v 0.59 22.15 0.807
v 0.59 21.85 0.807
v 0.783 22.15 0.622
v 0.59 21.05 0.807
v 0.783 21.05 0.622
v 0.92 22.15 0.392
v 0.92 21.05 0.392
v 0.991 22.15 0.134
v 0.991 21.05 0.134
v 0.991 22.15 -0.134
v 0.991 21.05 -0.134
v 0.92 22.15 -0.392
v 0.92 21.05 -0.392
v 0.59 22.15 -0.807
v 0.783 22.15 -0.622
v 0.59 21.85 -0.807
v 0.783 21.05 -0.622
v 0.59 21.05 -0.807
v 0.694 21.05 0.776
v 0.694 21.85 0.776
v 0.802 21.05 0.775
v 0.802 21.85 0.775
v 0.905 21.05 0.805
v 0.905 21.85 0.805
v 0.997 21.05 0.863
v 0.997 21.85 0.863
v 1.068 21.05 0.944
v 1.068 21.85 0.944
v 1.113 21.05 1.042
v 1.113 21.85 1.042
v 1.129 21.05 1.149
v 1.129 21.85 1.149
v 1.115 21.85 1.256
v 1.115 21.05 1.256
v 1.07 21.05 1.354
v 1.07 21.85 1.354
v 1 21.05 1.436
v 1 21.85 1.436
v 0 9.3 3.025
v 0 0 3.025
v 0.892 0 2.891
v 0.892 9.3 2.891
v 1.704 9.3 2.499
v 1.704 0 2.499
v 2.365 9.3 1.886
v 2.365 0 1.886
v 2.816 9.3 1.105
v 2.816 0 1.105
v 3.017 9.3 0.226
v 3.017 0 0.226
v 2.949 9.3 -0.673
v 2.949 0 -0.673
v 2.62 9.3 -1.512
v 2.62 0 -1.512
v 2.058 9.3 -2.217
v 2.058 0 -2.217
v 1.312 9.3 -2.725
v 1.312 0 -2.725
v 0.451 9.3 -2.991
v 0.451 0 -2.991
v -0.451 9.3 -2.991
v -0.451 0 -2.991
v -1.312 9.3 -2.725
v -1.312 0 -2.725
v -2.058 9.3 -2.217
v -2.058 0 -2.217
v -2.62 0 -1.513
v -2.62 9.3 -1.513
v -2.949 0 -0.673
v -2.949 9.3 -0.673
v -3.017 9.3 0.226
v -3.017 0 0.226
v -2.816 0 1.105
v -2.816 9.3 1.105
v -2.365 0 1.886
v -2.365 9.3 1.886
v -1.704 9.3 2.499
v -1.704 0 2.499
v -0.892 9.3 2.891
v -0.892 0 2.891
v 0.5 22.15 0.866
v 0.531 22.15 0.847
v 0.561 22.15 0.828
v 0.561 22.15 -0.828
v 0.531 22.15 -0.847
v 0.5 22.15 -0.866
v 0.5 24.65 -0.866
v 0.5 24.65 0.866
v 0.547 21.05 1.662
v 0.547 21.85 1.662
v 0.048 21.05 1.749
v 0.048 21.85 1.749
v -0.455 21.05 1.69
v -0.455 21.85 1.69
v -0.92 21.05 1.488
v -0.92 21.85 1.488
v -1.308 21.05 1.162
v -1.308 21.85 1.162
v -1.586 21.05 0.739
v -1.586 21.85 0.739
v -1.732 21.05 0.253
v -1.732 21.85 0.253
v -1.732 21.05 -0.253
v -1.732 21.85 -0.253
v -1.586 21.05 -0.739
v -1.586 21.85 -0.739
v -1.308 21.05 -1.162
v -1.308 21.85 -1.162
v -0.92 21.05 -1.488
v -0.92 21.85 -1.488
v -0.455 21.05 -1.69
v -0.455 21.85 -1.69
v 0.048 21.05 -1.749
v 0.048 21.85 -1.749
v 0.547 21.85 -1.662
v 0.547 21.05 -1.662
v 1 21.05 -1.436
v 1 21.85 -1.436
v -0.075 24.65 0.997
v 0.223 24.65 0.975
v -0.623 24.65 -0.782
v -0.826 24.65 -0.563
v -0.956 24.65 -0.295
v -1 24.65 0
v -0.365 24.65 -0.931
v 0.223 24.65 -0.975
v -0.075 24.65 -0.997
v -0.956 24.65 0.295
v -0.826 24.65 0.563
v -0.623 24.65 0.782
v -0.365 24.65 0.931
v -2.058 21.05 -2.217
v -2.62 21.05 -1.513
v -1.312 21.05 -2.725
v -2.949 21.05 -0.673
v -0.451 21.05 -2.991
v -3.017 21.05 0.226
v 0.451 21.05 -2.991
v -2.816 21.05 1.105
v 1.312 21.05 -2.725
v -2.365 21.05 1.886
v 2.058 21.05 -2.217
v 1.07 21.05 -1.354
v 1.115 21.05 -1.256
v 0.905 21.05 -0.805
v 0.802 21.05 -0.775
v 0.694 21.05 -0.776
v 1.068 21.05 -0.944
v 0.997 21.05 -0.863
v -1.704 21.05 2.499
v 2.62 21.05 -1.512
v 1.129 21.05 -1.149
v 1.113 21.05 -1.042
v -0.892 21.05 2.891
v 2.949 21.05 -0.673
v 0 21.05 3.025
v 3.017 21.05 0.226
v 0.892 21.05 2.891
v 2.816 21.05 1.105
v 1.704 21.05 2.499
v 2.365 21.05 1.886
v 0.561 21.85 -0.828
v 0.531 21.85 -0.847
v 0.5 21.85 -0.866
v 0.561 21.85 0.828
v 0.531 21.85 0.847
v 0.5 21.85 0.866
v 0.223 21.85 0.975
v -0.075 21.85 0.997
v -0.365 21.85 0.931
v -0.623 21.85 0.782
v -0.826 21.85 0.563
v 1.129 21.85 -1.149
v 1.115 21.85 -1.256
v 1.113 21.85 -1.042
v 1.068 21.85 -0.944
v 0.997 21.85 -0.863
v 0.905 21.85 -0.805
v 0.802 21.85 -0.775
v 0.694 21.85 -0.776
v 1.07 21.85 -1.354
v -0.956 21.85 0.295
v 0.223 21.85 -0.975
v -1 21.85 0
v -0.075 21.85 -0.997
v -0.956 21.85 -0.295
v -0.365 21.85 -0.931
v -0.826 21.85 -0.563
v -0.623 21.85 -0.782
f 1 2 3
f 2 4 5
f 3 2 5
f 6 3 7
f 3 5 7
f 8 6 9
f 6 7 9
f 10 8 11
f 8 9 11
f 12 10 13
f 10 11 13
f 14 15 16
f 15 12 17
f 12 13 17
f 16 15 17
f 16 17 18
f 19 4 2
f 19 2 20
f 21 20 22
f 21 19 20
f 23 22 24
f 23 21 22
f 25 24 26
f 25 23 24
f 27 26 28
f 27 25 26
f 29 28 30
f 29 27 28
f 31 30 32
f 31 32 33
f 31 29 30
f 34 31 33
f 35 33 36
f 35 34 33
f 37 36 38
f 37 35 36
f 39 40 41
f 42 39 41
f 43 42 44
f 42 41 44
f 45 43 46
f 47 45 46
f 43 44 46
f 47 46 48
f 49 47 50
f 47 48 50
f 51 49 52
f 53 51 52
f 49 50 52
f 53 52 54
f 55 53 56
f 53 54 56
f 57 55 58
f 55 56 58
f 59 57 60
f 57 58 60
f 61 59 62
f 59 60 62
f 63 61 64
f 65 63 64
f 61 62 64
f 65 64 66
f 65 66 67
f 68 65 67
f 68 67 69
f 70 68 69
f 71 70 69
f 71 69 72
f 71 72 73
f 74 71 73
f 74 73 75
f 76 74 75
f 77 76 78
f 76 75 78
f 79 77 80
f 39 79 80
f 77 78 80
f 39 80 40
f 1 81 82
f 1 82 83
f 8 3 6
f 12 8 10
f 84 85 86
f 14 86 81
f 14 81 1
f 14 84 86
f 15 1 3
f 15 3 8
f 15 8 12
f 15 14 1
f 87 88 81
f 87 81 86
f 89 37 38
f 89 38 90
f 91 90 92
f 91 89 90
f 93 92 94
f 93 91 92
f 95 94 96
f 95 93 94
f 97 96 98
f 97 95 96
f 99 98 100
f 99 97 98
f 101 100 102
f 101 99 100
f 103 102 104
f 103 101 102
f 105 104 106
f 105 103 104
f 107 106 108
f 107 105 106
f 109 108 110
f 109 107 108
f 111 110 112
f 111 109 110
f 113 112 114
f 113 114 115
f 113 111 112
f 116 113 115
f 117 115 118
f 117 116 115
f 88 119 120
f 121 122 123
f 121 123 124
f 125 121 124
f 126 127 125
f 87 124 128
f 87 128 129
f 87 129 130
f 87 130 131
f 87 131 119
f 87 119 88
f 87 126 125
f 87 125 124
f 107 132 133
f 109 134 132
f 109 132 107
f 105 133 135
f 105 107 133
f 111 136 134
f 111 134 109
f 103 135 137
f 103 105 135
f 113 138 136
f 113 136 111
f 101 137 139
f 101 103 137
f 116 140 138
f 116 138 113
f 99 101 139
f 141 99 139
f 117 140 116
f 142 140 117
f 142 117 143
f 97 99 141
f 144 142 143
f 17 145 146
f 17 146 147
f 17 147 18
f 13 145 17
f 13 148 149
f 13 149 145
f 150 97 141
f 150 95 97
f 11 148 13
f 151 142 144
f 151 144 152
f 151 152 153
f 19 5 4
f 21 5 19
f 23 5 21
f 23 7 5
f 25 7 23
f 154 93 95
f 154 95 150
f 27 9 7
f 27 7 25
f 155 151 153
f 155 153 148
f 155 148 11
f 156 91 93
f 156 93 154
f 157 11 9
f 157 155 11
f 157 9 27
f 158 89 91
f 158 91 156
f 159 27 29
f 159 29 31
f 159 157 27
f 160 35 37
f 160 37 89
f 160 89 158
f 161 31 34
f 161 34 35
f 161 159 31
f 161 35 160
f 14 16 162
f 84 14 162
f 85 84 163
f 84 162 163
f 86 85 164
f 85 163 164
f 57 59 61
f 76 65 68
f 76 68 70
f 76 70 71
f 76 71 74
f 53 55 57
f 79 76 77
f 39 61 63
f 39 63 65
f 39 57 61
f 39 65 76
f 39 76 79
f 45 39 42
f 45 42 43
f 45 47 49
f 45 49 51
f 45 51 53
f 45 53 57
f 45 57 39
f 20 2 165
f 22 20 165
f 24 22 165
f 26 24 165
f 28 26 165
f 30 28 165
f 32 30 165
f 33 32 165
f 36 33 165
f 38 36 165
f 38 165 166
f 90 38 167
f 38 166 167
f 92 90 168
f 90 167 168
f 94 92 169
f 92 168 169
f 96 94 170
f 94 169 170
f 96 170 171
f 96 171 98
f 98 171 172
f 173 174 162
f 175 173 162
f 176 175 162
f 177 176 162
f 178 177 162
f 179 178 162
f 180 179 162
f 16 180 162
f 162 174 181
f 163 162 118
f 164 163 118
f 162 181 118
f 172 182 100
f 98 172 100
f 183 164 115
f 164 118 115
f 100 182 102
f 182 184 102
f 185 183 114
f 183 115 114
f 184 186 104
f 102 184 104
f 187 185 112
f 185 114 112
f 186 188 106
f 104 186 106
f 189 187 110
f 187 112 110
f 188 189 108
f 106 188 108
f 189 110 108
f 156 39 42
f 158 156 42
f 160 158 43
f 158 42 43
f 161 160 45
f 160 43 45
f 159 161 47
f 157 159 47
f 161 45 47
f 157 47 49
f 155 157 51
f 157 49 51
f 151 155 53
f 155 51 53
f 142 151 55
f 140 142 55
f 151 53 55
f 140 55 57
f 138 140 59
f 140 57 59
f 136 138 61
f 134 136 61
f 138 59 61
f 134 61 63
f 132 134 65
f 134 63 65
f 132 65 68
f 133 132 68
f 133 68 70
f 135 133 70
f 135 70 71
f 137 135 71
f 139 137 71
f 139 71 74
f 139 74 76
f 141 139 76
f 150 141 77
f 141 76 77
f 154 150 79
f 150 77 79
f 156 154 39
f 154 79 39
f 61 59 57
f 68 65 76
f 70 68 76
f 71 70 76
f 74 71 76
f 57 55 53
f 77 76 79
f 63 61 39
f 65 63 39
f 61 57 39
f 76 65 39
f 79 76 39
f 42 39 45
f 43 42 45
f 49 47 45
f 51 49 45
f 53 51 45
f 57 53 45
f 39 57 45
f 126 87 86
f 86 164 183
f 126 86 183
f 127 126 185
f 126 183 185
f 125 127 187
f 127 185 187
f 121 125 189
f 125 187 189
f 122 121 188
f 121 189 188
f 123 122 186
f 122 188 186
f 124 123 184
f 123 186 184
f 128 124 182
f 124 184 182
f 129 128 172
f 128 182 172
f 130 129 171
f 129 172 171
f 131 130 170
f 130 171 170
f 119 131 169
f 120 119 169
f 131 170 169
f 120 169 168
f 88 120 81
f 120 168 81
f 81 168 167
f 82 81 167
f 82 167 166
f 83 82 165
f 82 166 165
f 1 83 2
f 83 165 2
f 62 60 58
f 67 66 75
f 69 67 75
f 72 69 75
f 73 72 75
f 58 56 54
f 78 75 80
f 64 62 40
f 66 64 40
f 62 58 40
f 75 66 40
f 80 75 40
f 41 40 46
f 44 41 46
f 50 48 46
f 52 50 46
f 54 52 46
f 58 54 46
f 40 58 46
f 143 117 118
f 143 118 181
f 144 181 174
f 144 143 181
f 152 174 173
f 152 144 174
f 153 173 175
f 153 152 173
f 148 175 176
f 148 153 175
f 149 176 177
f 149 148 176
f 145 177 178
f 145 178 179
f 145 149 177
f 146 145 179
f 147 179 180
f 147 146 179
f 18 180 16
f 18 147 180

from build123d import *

# Parameters (mm, degrees)
SKETCH3_R           = 3.025
BOSS_EXTRUDE1_DEPTH = 9.3
SKETCH4_R           = 3.025
BOSS_EXTRUDE4_DEPTH = 11.75
BOSS_EXTRUDE5_DEPTH = 0.8
BOSS_EXTRUDE6_DEPTH = 3.6
BOSS_EXTRUDE7_DEPTH = 1.1


with BuildPart() as part:
    # Sketch3 → Boss-Extrude1 (new body)
    with BuildSketch(Plane(origin=(0, 0, 0), x_dir=(1, 0, 0), z_dir=(0, 1, 0))):
        Circle(SKETCH3_R)
    extrude(amount=BOSS_EXTRUDE1_DEPTH)


with BuildPart() as body_2:
    # Sketch4 → Boss-Extrude4 (new body)
    with BuildSketch(Plane(origin=(0, 9.3, 0), x_dir=(1, 0, 0), z_dir=(0, 1, 0))):
        Circle(SKETCH4_R)
    extrude(amount=BOSS_EXTRUDE4_DEPTH)

    # Sketch5 → Boss-Extrude5 (add)
    with BuildSketch(Plane(origin=(0, 21.05, 0), x_dir=(1, 0, 0), z_dir=(0, 1, 0))):
        with BuildLine():
            ThreePointArc((0.5, -0.866025404), (-1, 0), (0.5, 0.866025404))
            ThreePointArc((0.5, 0.866025404), (0.5459595, 0.837811569), (0.590331188, 0.807161129))
            ThreePointArc((0.590331188, 0.807161129), (1.067738399, 0.9440258), (1.00014128, 1.436042276))
            ThreePointArc((1.00014128, 1.436042276), (-1.75, 0), (1.00014128, -1.436042276))
            ThreePointArc((1.00014128, -1.436042276), (1.067738399, -0.9440258), (0.590331188, -0.807161129))
            ThreePointArc((0.590331188, -0.807161129), (0.5459595, -0.837811569), (0.5, -0.866025404))
        make_face()
    extrude(amount=BOSS_EXTRUDE5_DEPTH)

    # Sketch5<4> → Boss-Extrude6 (add)
    with BuildSketch(Plane(origin=(0, 21.05, 0), x_dir=(1, 0, 0), z_dir=(0, 1, 0))):
        with BuildLine():
            Line((0.5, -0.866025404), (0.5, 0.866025404))
            ThreePointArc((0.5, 0.866025404), (-1, 0), (0.5, -0.866025404))
        make_face()
    extrude(amount=BOSS_EXTRUDE6_DEPTH)

    # Sketch5<5> → Boss-Extrude7 (add)
    with BuildSketch(Plane(origin=(0, 21.05, 0), x_dir=(1, 0, 0), z_dir=(0, 1, 0))):
        with BuildLine():
            ThreePointArc((0.590331188, 0.807161129), (0.5459595, 0.837811569), (0.5, 0.866025404))
            Line((0.5, 0.866025404), (0.5, -0.866025404))
            ThreePointArc((0.5, -0.866025404), (0.5459595, -0.837811569), (0.590331188, -0.807161129))
            ThreePointArc((0.590331188, -0.807161129), (1, 0), (0.590331188, 0.807161129))
        make_face()
    extrude(amount=BOSS_EXTRUDE7_DEPTH)


solid = Compound([part.part, body_2.part])
